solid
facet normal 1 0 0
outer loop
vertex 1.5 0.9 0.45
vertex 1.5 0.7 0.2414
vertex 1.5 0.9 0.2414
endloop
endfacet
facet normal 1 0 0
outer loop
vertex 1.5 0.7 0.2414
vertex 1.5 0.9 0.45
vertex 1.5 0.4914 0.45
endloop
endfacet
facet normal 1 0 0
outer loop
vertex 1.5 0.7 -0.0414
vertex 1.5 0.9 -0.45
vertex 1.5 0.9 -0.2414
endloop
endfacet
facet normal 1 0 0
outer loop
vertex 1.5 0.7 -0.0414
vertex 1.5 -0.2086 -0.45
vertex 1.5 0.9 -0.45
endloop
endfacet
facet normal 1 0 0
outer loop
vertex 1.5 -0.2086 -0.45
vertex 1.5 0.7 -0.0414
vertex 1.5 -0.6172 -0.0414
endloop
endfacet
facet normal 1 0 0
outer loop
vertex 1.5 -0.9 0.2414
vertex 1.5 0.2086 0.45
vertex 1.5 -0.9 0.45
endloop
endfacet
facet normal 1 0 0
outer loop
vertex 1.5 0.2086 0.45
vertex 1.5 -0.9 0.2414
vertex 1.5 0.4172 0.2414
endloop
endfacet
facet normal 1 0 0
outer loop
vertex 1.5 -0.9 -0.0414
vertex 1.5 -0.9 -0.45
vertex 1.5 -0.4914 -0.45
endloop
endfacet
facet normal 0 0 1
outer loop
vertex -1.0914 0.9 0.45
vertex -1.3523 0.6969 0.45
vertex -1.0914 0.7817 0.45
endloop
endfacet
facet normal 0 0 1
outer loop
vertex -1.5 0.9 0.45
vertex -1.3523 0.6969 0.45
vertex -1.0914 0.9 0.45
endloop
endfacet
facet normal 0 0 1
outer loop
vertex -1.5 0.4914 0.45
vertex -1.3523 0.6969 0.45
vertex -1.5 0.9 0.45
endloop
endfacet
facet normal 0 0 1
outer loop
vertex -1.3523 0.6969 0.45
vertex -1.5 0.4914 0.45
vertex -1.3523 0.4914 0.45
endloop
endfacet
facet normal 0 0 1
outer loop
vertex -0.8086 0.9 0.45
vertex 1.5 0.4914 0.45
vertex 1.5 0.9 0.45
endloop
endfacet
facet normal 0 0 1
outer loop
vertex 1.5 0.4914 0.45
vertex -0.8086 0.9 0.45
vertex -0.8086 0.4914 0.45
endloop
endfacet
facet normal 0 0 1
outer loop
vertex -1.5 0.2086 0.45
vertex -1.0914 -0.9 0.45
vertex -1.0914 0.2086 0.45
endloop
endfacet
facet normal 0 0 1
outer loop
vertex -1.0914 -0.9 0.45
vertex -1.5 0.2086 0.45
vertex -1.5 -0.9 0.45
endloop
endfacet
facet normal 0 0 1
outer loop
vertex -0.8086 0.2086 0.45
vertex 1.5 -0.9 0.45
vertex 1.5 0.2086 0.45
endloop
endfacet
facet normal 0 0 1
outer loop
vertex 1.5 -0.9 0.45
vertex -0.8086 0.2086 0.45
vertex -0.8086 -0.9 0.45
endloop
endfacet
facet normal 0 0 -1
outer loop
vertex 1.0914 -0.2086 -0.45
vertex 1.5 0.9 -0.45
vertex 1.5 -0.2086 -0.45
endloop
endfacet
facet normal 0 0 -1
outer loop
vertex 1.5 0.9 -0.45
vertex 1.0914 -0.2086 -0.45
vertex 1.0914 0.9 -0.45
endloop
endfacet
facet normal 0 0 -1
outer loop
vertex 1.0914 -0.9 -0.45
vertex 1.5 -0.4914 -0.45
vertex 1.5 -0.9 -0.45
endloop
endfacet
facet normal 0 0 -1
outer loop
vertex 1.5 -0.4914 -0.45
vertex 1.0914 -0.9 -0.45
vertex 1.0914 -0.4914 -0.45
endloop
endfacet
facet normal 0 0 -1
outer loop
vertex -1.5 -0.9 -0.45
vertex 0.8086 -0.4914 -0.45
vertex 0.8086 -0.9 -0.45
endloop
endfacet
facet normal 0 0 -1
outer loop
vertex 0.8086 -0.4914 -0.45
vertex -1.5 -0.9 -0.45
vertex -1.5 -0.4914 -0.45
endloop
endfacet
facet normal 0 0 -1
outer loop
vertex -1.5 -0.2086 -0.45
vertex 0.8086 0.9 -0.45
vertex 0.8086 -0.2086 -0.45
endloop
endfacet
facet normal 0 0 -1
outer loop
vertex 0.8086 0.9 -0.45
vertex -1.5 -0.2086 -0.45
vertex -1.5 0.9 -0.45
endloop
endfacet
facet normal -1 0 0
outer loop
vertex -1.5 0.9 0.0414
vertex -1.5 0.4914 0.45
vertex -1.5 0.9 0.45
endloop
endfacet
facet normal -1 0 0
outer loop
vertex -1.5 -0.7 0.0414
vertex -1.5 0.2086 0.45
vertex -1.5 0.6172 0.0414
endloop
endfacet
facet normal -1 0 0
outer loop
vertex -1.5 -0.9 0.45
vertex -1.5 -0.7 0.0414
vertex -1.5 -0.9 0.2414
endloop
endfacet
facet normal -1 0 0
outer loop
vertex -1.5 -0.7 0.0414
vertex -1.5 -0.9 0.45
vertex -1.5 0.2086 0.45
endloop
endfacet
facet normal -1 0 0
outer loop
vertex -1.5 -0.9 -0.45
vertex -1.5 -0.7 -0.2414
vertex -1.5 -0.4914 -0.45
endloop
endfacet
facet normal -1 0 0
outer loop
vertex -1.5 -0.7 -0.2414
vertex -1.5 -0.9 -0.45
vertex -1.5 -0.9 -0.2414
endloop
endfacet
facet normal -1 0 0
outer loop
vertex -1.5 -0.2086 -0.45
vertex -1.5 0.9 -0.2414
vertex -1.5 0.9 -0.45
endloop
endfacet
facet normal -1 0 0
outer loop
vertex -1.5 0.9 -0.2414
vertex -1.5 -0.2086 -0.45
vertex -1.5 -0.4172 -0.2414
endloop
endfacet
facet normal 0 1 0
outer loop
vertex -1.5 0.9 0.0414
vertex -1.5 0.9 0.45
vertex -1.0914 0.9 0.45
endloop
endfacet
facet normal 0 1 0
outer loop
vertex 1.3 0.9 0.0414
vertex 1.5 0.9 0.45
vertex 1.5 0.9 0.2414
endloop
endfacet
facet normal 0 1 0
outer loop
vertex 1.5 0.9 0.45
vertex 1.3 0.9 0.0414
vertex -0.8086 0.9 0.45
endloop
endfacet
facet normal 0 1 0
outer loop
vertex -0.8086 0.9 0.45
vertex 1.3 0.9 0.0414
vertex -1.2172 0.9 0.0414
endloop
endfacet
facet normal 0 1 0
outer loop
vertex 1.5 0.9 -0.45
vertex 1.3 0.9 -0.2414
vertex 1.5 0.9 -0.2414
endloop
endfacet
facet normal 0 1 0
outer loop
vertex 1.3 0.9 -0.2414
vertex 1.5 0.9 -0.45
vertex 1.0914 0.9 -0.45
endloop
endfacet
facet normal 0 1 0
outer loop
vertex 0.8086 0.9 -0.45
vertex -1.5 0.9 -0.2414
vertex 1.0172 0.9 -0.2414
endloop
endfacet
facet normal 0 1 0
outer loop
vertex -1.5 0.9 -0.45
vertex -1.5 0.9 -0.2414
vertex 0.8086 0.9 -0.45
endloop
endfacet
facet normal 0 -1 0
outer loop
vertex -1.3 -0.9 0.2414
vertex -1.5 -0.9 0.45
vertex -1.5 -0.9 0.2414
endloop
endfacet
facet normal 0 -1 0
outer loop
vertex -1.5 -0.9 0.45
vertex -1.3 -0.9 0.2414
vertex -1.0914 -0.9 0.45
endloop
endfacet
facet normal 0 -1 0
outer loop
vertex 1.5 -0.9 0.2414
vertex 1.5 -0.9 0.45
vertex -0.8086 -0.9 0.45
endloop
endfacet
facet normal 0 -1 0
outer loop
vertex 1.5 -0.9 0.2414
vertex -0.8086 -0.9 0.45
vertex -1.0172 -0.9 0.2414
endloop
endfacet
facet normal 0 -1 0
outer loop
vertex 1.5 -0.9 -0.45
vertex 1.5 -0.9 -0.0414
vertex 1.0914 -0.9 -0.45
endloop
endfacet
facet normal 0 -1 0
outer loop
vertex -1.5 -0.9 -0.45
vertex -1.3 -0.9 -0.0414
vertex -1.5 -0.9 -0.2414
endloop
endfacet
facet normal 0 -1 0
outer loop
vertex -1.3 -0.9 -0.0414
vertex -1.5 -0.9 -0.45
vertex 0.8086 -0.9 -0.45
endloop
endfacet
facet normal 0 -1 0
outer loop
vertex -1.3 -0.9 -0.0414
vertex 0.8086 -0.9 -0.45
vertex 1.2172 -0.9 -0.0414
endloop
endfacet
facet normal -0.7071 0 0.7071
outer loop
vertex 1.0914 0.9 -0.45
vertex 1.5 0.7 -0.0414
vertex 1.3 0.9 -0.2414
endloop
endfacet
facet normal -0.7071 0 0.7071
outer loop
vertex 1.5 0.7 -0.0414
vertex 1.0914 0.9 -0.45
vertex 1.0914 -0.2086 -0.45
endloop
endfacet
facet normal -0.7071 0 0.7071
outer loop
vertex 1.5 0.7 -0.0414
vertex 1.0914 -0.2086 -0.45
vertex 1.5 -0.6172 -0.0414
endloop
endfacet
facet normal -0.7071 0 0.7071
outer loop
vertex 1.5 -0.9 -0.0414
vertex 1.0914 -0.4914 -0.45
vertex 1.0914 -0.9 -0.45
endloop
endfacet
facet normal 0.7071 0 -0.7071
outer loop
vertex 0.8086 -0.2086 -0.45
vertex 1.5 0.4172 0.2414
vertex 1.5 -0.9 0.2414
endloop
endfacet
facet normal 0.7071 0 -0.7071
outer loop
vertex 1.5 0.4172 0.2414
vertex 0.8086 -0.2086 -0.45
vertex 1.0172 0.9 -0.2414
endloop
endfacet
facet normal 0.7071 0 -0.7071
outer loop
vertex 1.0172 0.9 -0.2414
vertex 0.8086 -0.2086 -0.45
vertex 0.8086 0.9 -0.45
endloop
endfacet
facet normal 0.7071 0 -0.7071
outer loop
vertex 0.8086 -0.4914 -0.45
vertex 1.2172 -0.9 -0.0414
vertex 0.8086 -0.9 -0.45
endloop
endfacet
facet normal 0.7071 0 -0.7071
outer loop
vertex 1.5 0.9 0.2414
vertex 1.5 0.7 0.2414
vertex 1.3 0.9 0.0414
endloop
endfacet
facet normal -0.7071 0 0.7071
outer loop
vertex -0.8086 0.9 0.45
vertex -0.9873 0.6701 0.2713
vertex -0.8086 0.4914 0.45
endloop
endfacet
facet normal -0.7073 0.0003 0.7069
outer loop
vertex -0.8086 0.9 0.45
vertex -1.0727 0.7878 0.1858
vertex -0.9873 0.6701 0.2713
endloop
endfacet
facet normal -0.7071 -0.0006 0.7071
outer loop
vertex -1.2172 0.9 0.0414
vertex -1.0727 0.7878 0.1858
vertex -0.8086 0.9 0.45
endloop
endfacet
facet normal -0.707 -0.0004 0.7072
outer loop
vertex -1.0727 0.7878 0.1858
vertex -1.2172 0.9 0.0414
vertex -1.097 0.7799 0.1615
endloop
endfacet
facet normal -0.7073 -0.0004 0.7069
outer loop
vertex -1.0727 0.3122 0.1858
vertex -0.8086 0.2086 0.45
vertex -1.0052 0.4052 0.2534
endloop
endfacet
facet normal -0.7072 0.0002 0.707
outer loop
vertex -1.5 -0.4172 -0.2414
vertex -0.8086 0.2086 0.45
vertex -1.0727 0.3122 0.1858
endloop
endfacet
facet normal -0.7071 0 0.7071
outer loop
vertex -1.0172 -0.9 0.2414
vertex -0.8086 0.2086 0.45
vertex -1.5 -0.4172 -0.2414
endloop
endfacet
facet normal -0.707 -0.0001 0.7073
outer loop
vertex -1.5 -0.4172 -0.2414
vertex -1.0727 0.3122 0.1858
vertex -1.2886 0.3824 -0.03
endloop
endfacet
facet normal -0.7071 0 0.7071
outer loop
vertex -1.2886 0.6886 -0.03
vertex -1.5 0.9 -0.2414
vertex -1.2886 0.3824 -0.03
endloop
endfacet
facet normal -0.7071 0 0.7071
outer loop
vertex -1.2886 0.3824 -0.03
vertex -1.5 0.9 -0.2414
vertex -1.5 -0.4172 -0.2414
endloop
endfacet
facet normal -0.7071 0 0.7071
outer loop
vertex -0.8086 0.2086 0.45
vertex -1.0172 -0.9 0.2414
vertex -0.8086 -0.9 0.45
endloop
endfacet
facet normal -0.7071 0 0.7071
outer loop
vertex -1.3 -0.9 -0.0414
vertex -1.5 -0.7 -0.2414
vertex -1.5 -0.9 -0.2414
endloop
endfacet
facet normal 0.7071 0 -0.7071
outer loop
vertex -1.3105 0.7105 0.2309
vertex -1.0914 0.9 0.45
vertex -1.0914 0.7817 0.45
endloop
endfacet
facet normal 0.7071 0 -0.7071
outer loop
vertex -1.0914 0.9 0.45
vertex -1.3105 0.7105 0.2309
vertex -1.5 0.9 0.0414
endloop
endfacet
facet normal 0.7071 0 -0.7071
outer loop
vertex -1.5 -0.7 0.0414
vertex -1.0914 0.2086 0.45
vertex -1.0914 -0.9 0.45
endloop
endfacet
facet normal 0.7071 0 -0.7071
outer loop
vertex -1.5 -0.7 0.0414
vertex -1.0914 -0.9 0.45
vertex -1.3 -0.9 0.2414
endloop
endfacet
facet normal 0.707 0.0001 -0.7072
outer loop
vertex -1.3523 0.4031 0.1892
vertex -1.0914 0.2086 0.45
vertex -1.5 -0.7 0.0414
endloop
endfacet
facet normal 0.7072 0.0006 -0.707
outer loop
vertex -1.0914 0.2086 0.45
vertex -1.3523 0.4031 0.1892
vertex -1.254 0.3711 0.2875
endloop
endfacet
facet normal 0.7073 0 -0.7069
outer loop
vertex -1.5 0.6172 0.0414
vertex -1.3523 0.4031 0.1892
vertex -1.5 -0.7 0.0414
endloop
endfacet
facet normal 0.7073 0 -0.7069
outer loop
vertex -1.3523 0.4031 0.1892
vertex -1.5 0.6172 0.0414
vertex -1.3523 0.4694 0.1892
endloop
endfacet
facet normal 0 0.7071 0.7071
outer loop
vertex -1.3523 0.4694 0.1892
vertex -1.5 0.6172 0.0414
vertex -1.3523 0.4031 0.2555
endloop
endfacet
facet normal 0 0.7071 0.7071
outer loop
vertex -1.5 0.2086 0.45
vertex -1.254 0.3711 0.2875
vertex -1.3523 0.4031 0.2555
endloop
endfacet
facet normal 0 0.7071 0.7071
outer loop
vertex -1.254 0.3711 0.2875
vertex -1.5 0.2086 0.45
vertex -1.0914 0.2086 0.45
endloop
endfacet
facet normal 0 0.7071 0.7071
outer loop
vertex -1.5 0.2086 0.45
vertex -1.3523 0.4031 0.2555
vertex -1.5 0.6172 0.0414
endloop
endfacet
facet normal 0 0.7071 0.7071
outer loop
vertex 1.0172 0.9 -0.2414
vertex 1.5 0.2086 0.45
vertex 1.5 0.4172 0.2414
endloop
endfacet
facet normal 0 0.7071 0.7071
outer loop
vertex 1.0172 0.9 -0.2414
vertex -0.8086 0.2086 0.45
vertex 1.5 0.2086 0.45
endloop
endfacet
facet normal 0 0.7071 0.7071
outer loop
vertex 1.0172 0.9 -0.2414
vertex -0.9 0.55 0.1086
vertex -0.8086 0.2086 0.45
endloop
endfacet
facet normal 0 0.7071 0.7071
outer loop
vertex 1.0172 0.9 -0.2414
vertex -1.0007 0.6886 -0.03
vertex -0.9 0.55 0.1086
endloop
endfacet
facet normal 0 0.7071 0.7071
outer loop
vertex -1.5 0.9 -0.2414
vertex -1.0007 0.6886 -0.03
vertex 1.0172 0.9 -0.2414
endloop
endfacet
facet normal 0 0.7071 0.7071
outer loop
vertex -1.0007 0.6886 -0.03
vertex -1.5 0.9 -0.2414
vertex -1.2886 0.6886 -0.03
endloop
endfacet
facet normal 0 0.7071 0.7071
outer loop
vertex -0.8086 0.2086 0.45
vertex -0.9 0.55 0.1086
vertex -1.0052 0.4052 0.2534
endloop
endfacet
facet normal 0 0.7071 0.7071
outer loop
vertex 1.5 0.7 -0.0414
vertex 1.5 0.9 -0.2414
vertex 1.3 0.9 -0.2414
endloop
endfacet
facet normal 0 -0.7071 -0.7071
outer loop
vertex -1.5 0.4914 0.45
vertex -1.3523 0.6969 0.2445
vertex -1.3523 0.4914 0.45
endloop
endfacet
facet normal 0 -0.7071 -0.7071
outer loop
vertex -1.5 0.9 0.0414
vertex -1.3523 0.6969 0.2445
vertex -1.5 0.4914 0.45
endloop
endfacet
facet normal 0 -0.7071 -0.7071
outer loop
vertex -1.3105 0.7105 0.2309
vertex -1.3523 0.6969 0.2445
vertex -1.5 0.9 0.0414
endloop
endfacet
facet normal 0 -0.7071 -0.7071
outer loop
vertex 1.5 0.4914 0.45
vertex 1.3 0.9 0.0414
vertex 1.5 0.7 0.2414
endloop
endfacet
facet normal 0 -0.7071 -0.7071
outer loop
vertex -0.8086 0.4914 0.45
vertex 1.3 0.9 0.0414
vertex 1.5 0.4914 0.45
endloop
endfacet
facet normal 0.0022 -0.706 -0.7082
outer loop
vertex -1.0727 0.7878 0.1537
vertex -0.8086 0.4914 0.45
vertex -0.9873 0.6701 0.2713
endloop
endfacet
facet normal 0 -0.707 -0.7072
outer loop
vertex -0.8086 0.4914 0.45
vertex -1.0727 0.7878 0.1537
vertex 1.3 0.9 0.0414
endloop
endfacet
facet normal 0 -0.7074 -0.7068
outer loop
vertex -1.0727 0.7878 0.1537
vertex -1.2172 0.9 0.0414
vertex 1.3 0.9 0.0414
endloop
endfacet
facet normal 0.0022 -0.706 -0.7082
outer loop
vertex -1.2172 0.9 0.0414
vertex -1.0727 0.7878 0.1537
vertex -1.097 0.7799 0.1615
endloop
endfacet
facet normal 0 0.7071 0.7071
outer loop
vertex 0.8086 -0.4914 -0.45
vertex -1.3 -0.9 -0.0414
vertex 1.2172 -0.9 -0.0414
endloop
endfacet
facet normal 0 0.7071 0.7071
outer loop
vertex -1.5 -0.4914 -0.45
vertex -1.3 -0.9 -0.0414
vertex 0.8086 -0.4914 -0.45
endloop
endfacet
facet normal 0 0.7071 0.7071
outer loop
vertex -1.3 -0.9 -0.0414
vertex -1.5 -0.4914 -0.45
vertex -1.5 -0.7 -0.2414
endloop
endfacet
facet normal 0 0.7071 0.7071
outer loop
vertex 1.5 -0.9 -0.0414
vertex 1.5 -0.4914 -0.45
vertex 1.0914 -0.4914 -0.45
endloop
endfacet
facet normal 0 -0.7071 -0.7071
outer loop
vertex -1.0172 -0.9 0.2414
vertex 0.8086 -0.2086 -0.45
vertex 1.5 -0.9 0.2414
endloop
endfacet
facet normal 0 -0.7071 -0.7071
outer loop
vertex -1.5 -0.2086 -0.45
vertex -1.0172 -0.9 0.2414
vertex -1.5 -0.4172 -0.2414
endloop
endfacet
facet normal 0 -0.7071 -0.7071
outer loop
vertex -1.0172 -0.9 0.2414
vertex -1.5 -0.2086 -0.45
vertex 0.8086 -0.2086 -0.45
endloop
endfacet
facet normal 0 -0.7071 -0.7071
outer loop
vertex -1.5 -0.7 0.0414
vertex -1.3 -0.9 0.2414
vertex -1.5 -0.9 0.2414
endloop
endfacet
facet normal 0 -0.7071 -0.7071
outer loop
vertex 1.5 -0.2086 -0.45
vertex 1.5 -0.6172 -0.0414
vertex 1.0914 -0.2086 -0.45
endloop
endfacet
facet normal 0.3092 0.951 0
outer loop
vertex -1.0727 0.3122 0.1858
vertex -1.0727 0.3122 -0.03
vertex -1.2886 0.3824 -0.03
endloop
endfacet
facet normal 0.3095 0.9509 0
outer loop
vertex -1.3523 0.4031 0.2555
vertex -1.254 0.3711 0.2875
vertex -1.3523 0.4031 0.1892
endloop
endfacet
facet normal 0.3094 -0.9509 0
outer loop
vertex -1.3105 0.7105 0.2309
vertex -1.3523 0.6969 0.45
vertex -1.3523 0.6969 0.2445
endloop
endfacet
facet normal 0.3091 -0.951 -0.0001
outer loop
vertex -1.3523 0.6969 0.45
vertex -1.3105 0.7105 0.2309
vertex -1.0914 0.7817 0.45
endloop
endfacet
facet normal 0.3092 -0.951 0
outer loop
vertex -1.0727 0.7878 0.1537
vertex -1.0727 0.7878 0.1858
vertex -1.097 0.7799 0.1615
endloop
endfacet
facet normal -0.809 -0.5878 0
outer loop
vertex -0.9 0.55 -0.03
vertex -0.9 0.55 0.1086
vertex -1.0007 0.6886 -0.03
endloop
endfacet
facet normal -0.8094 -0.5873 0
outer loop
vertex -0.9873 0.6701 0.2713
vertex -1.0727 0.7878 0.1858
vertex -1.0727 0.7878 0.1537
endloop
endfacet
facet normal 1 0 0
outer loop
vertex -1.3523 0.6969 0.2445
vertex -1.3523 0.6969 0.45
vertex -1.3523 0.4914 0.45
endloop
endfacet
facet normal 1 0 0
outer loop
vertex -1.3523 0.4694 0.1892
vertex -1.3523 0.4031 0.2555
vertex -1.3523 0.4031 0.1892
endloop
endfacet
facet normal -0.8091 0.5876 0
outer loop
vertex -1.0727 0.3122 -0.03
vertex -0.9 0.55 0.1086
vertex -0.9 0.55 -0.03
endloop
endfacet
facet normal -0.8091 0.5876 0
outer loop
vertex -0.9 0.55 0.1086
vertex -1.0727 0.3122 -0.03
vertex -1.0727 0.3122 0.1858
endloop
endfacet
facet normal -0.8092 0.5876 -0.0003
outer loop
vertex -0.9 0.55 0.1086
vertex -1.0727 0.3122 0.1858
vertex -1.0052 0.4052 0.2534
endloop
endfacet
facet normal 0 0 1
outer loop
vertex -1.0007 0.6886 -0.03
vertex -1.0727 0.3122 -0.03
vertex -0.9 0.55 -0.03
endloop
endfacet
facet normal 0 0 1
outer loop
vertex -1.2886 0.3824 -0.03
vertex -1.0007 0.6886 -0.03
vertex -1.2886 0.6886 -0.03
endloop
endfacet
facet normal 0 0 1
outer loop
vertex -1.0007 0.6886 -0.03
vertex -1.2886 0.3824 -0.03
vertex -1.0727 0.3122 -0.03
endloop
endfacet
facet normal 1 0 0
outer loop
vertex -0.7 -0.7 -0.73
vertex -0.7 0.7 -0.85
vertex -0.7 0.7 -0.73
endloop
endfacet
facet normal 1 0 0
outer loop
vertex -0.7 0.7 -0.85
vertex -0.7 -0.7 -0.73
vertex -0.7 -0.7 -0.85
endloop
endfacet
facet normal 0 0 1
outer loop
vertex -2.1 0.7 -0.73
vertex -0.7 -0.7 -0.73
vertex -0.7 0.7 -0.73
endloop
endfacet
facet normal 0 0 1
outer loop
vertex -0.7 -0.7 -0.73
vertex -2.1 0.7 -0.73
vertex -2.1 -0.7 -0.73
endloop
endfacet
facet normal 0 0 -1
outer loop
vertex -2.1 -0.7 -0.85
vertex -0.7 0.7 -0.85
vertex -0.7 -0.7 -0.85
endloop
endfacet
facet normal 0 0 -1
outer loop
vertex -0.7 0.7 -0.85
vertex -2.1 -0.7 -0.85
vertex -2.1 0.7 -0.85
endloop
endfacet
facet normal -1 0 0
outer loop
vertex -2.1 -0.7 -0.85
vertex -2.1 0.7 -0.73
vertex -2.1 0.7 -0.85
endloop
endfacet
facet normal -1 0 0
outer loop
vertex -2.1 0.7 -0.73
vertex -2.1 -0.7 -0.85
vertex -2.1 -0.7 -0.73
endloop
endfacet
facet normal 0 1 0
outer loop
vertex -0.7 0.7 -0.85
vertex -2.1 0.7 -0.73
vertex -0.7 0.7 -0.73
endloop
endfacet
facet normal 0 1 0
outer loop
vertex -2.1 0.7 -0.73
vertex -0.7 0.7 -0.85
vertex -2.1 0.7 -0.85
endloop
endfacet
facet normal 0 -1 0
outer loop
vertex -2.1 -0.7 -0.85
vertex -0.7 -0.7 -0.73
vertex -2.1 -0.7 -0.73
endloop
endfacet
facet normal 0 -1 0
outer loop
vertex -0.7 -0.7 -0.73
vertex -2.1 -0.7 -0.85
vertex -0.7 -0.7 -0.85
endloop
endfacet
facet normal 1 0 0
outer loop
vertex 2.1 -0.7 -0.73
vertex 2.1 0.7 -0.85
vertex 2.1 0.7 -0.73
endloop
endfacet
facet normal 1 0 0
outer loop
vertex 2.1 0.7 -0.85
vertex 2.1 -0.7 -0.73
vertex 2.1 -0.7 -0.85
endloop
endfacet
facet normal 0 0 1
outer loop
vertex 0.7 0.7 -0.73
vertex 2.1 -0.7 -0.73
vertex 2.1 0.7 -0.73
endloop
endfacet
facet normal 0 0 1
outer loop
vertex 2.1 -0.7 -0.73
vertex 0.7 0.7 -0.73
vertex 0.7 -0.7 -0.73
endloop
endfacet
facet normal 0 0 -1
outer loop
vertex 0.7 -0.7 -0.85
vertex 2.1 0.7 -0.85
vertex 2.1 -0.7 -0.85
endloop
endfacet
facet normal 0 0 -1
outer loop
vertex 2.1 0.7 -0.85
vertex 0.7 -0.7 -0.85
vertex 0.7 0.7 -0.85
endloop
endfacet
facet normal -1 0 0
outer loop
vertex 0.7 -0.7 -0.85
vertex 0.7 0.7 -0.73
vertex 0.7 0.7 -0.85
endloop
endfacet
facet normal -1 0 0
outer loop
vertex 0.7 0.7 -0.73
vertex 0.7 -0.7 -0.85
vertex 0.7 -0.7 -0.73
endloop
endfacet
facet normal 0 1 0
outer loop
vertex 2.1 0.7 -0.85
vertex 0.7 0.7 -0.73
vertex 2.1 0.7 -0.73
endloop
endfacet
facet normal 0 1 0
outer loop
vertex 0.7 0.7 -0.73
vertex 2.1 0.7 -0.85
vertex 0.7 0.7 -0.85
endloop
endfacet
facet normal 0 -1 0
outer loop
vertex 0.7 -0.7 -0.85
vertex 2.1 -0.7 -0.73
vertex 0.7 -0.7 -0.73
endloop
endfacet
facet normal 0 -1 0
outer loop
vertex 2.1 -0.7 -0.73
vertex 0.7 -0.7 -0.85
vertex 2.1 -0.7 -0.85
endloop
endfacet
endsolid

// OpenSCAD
// Parameters
body_length = 3.0; //[1.5:6.0:0.1]
body_width = 1.8; //[0.9:3.6:0.1]
body_height = 0.9; //[0.45:1.8:0.05]
pad_length = 0.6; //[0.3:1.2:0.05]
pad_width = 1.4; //[0.7:2.0:0.05]
pad_thickness = 0.12; //[0.05:0.3:0.01]
pad_overlap = 0.8; //[0.5:1.5:0.05]
mark_radius = 0.25; //[0.12:0.5:0.01]
mark_depth = 0.08; //[0.03:0.2:0.01]
mark_edge_margin = 0.35; //[0.2:0.7:0.05]
chamfer_size = 0.2; //[0.1:0.5:0.05]
connect_overlap = 0.8; //[0.5:2.0:0.1]

// Base shapes
module smd_body() {
  color("DimGray")
  cube([body_length, body_width, body_height], center=true);
}

module terminal_pad_left() {
  translate([-body_length/2 - pad_length/2 + pad_overlap/2, 0, -body_height/2 + pad_thickness/2 - connect_overlap/2])
  color("Silver")
  cube([pad_length + pad_overlap, pad_width, pad_thickness], center=true);
}

module terminal_pad_right() {
  translate([body_length/2 + pad_length/2 - pad_overlap/2, 0, -body_height/2 + pad_thickness/2 - connect_overlap/2])
  color("Silver")
  cube([pad_length + pad_overlap, pad_width, pad_thickness], center=true);
}

module polarity_mark_cutter() {
  translate([-body_length/2 + mark_edge_margin, body_width/2 - mark_edge_margin, body_height/2 - mark_depth/2])
  cylinder(r=mark_radius, h=mark_depth + connect_overlap, center=true);
}

module chamfer_cutter_xpos() {
  translate([body_length/2 - chamfer_size/2, 0, 0])
  rotate([0, 45, 0])
  cube([chamfer_size, body_width + connect_overlap, body_height + connect_overlap], center=true);
}

module chamfer_cutter_xneg() {
  translate([-body_length/2 + chamfer_size/2, 0, 0])
  rotate([0, 45, 0])
  cube([chamfer_size, body_width + connect_overlap, body_height + connect_overlap], center=true);
}

module chamfer_cutter_ypos() {
  translate([0, body_width/2 - chamfer_size/2, 0])
  rotate([45, 0, 0])
  cube([body_length + connect_overlap, chamfer_size, body_height + connect_overlap], center=true);
}

module chamfer_cutter_yneg() {
  translate([0, -body_width/2 + chamfer_size/2, 0])
  rotate([45, 0, 0])
  cube([body_length + connect_overlap, chamfer_size, body_height + connect_overlap], center=true);
}

// Operations
module terminal_pads() {
  union() {
    terminal_pad_left();
    terminal_pad_right();
  }
}

module edge_chamfers() {
  difference() {
    smd_body();
    chamfer_cutter_xpos();
    chamfer_cutter_xneg();
    chamfer_cutter_ypos();
    chamfer_cutter_yneg();
  }
}

module polarity_mark() {
  difference() {
    edge_chamfers();
    polarity_mark_cutter();
  }
}

module smd_complete() {
  union() {
    polarity_mark();
    terminal_pads();
  }
}

// Final output
smd_complete();
